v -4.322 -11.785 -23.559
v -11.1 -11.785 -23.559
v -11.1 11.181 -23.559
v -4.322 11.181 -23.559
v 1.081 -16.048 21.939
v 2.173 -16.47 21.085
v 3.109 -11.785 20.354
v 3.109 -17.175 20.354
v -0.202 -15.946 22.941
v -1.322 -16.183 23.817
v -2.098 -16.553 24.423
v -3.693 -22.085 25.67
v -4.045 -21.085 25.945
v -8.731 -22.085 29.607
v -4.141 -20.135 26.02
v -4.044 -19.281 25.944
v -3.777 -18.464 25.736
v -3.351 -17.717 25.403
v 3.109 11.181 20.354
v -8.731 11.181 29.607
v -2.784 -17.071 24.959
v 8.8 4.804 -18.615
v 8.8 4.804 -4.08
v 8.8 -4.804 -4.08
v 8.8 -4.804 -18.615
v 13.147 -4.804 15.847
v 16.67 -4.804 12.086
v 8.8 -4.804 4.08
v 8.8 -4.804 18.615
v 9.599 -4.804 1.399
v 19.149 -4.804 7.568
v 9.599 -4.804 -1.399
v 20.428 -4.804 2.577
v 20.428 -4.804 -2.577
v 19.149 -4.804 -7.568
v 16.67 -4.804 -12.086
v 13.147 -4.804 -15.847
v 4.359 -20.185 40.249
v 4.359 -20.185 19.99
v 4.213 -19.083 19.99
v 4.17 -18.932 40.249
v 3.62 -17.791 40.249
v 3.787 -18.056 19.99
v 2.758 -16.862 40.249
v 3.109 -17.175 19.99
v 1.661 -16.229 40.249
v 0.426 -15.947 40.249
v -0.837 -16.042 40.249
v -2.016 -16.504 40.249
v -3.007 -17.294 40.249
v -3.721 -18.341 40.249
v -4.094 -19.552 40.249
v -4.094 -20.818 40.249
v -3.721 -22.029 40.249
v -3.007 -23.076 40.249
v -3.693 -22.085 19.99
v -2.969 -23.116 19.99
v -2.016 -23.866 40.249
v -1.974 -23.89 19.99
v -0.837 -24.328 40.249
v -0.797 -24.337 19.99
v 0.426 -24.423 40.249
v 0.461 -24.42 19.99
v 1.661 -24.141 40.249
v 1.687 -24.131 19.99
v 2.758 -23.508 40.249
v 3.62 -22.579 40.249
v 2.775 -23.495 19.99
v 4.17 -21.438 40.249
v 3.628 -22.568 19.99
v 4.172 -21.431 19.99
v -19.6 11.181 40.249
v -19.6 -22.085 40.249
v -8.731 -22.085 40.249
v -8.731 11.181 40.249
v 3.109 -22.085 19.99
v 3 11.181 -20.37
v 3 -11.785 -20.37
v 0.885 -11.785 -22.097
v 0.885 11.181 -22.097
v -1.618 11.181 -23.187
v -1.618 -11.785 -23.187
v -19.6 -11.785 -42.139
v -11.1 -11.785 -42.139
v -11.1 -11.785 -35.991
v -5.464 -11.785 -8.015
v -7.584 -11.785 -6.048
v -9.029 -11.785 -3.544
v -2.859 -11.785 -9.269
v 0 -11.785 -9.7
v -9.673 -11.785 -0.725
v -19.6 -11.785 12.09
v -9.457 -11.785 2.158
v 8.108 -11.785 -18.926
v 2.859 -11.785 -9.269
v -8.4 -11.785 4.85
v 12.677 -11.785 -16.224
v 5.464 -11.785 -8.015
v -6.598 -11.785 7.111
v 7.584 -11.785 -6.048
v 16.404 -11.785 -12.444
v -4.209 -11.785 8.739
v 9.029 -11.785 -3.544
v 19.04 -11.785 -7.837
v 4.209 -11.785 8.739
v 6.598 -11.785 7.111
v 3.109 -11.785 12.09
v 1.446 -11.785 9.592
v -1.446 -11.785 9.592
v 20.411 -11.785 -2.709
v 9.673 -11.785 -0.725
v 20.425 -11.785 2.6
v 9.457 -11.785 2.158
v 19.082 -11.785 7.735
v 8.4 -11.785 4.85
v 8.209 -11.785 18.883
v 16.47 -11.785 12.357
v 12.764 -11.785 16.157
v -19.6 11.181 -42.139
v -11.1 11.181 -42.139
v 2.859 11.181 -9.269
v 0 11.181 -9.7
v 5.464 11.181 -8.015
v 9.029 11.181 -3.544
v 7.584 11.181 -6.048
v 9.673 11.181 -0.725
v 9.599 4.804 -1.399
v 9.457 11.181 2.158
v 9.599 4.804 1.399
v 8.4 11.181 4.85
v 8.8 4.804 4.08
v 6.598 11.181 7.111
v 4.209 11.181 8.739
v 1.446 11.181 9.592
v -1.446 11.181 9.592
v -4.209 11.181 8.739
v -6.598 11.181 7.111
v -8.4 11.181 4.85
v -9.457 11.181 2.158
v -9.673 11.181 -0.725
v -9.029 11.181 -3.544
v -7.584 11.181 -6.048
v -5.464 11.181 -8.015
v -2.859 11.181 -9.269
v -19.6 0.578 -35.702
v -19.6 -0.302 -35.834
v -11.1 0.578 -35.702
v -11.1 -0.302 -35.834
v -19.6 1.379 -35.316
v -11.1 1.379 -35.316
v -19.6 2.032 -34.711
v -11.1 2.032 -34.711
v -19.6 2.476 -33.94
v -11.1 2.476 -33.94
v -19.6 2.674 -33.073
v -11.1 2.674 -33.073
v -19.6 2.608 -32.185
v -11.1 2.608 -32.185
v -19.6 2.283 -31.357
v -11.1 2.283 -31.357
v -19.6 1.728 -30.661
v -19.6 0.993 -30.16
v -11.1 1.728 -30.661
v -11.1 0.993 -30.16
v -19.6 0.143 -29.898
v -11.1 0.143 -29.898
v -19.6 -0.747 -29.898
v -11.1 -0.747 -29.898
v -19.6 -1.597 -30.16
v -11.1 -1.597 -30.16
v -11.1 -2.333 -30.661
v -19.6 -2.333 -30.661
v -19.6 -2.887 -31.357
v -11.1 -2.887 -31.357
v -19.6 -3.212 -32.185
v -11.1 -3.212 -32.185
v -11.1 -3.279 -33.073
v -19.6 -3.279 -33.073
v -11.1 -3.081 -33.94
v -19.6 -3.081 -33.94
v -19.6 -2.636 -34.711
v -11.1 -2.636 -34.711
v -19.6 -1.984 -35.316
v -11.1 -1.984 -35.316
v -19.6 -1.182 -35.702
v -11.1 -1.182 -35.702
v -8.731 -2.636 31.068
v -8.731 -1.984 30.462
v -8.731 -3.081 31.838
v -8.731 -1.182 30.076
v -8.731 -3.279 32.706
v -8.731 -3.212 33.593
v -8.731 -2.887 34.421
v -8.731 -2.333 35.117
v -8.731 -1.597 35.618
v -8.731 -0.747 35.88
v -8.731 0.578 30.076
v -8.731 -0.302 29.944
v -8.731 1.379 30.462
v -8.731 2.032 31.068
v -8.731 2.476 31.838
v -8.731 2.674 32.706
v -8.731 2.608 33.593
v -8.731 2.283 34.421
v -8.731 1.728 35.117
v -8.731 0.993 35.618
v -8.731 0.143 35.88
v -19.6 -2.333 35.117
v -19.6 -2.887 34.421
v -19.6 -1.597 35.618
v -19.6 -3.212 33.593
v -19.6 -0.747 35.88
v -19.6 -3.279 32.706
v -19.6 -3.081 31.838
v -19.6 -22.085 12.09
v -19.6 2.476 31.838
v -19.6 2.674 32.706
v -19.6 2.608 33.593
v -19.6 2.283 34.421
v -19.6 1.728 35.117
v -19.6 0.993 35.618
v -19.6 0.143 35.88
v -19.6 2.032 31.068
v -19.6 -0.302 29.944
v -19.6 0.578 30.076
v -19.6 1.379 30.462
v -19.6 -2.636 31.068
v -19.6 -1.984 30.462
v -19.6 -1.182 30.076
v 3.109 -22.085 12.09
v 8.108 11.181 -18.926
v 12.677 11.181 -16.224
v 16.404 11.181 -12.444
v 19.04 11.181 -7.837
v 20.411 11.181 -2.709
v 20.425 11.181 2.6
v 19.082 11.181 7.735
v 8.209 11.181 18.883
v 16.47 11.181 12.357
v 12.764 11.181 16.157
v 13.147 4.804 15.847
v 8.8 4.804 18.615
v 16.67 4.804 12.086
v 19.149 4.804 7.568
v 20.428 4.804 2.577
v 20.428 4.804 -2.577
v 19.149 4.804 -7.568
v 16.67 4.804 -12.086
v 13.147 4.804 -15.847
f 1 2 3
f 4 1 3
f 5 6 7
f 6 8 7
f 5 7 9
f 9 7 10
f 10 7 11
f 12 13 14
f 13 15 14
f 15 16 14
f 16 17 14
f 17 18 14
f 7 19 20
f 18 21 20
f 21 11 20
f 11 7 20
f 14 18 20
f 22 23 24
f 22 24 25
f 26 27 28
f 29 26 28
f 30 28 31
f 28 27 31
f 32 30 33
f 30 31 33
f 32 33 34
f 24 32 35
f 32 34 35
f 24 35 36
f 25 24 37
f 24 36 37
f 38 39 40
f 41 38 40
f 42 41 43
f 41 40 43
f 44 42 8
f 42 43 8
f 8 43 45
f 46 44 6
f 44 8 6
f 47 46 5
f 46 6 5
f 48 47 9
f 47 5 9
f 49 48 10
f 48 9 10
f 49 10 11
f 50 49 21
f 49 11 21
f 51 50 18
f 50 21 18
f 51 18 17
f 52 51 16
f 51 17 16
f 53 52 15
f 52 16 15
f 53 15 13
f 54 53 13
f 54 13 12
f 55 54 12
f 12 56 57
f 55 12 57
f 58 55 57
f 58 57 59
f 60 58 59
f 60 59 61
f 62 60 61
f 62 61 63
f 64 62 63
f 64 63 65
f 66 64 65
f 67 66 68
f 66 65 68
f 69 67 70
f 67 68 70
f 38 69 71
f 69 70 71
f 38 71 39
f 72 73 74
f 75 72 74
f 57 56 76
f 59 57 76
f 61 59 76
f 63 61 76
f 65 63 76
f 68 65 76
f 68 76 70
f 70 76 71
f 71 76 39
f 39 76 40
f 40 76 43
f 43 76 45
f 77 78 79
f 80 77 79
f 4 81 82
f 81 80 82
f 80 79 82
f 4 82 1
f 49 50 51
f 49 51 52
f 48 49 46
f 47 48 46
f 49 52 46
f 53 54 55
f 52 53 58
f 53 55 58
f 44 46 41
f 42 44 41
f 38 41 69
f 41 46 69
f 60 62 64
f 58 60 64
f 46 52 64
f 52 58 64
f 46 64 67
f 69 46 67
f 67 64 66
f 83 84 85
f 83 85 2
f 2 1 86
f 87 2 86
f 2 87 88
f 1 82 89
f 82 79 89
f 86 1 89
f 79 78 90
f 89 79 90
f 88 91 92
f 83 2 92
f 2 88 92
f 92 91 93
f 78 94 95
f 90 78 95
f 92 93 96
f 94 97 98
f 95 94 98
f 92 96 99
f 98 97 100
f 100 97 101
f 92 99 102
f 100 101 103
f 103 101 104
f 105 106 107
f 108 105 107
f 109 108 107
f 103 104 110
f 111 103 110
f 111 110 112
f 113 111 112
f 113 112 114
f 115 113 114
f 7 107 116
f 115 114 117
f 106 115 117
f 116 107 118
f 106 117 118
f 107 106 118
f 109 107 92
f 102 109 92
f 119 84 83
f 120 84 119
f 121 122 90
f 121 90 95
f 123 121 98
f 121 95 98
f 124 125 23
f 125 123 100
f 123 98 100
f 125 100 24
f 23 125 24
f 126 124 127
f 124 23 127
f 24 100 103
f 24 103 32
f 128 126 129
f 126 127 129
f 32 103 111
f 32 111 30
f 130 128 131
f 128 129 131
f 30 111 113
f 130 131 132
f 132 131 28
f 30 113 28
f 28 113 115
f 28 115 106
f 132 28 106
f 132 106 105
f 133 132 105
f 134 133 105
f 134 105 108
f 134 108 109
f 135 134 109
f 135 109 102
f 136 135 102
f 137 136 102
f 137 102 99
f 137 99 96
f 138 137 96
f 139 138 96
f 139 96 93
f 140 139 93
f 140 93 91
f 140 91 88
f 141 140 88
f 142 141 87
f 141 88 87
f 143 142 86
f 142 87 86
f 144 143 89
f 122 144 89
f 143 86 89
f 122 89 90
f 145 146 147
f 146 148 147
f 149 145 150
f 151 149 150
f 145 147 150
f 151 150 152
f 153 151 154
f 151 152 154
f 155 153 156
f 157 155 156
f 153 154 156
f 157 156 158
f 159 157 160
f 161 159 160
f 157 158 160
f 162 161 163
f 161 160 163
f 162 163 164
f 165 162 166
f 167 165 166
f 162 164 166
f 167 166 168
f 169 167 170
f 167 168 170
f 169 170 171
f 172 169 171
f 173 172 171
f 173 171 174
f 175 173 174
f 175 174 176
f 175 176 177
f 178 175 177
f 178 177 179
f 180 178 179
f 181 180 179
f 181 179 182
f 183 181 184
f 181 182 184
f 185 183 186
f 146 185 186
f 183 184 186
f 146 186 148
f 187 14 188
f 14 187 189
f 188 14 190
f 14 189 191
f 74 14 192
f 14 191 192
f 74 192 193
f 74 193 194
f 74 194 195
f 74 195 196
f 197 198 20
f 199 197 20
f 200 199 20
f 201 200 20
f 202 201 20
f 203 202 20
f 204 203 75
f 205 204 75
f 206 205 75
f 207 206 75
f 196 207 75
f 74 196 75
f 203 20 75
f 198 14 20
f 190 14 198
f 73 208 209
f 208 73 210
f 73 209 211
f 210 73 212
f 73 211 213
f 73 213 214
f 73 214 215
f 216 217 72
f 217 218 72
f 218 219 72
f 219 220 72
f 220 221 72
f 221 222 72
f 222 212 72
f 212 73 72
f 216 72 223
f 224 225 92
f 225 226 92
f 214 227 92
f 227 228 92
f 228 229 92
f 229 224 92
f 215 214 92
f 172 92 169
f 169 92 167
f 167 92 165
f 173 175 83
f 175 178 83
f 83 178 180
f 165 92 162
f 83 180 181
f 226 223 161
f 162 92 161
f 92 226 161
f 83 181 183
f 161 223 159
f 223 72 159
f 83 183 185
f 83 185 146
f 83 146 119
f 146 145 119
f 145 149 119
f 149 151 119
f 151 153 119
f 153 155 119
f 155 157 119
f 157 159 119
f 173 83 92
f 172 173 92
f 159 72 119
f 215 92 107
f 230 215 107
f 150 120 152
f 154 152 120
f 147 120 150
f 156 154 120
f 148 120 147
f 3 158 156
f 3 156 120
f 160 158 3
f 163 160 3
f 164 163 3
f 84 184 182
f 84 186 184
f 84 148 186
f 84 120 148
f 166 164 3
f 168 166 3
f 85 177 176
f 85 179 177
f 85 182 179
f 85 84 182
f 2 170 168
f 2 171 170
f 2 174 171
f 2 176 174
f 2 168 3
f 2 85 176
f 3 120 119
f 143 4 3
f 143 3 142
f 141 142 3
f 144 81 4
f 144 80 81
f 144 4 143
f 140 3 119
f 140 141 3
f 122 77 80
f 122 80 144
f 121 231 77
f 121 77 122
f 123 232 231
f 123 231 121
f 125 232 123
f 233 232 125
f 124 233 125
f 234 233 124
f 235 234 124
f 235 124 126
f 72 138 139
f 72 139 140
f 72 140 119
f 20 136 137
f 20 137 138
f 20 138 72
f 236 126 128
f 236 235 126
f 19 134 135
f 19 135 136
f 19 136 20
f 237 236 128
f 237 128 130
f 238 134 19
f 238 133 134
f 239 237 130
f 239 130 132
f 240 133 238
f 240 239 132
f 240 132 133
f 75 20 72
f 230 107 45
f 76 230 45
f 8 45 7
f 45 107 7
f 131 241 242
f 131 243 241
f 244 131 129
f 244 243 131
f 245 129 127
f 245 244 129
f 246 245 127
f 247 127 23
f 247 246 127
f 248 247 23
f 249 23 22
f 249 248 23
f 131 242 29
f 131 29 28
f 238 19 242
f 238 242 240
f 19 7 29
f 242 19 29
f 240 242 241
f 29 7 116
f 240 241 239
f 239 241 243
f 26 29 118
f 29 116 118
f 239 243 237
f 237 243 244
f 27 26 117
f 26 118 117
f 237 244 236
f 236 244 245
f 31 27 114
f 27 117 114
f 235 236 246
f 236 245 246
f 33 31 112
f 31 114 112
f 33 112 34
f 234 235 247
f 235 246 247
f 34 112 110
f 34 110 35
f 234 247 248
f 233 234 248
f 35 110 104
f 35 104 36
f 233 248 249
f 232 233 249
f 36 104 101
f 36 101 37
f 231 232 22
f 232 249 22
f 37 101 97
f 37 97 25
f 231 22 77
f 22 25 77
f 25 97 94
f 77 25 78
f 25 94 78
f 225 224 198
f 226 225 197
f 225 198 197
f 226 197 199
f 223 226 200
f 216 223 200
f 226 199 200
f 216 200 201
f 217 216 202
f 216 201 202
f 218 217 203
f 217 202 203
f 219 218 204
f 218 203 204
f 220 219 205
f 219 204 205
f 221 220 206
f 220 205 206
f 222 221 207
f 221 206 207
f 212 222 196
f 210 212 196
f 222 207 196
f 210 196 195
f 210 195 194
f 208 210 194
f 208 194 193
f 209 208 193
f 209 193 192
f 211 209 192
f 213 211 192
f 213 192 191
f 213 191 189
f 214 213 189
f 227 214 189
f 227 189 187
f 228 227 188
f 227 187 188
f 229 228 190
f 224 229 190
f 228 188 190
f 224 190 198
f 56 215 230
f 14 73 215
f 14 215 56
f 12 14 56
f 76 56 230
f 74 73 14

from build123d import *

# Parameters (mm, degrees)
SKETCH_1_R                = 20.68
SKETCH_1_R_2              = 9.68
EXTRUDE_1_DEPTH           = 116.68
SKETCH_11_W               = 27
SKETCH_11_H               = 150
CUT_EXTRUDE_3_DEPTH       = 40
SKETCH_13_W               = 10
SKETCH_13_H               = 128.345013401
CUT_EXTRUDE_7_DEPTH       = 126.614916312
SKETCH_15_W               = 8
SKETCH_15_H               = 68.68
CUT_EXTRUDE_9_DEPTH       = 48
SKETCH_16_W               = 15.549431524
SKETCH_16_H               = 20
SKETCH_16_W_2             = 15.459431524
EXTRUDE_4_DEPTH           = 19.2
SKETCH_17_W               = 19.20851187
SKETCH_17_H               = 14.03
CUT_EXTRUDE_10_DEPTH      = 20.2
SKETCH_18_R               = 9.59
CUT_EXTRUDE_11_DEPTH      = 121.289430957
SKETCH_21_R               = 2.985
CUT_EXTRUDE_12_DEPTH      = 55.2
EXTRUDE_START             = 55.2
SKETCH_24_R               = 20.59
SKETCH_24_R_2             = 9.59
EXTRUDE_2_DEPTH           = 55.2
CUT_EXTRUDE_13_DEPTH      = 55.2
SKETCH_26_W               = 10.00851187
SKETCH_26_H               = 41.68
CUT_EXTRUDE_15_DEPTH      = 55.2
SKETCH_27_W               = 10
SKETCH_27_H               = 40
CUT_EXTRUDE_16_DEPTH      = 55.2
SKETCH_28_W               = 44.880694938
SKETCH_28_H               = 9.608044066
CUT_EXTRUDE_17_DEPTH      = 12.2
SKETCH_35_W               = 13.53
SKETCH_35_H               = 20
EXTRUDE_10_DEPTH          = 15
EXTRUDE_11_DEPTH          = 15
SKETCH_37_W               = 9
SKETCH_37_H               = 20
EXTRUDE_12_DEPTH          = 20
SKETCH_38_W               = 9
SKETCH_38_H               = 20
EXTRUDE_13_DEPTH          = 20
SKETCH_42_R               = 2.985
CUT_EXTRUDE_21_DEPTH      = 20
CUT_EXTRUDE_23_DEPTH      = 138.235841092
SKETCH_45_W               = 3
SKETCH_45_H               = 20
EXTRUDE_14_DEPTH          = 30
SKETCH_46_W               = 3
SKETCH_46_H               = 20
EXTRUDE_15_DEPTH          = 30
SKETCH_47_W               = 33.078221107
SKETCH_47_H               = 20
EXTRUDE_16_DEPTH          = 50
SKETCH_48_W               = 30
SKETCH_48_H               = 20
EXTRUDE_17_DEPTH          = 50
SKETCH_50_W               = 50
SKETCH_50_H               = 20
EXTRUDE_18_DEPTH          = 1
SKETCH_51_W               = 50
SKETCH_51_H               = 20
EXTRUDE_19_DEPTH          = 1
SKETCH_52_W               = 53
SKETCH_52_H               = 14
CUT_EXTRUDE_24_DEPTH      = 151.972575738
SKETCH_53_W               = 53
SKETCH_53_H               = 14
CUT_EXTRUDE_25_DEPTH      = 151.942387436
SKETCH_54_W               = 40
SKETCH_54_H               = 73.27
CUT_EXTRUDE_26_DEPTH      = 147.866192927
SKETCH_56_W               = 13.00851187
SKETCH_56_H               = 20
EXTRUDE_21_DEPTH          = 3.08
SKETCH_60_W               = 6.504255935
SKETCH_60_H               = 76.35
CUT_EXTRUDE_30_DEPTH      = 137.106994034
CUT_EXTRUDE_32_DEPTH      = 20
SKETCH_64_W               = 16.20851187
SKETCH_64_H               = 0.09
EXTRUDE_22_DEPTH          = 20
SKETCH_65_W               = 3.495744065
SKETCH_65_H               = 3.26
CUT_EXTRUDE_33_DEPTH      = 137.057988464
SKETCH_66_W               = 3.495744065
SKETCH_66_H               = 1.776778893
SKETCH_66_W_2             = 3.503635083
SKETCH_66_H_2             = 1.775
EXTRUDE_23_DEPTH          = 20.2
SKETCH_68_W               = 6.504255935
SKETCH_68_H               = 3.66
CUT_EXTRUDE_34_DEPTH      = 20
SKETCH_69_R               = 2.985
CUT_EXTRUDE_35_DEPTH      = 126.598983893
SKETCH_70_R               = 2.985
CUT_EXTRUDE_36_DEPTH      = 132.360728238
SKETCH_71_W               = 38.005321573
SKETCH_71_H               = 111.965885132
CUT_EXTRUDE_37_DEPTH      = 147.475577566
SKETCH_72_R               = 9.7
CUT_EXTRUDE_38_DEPTH      = 38.185254838
CUT_EXTRUDE_START         = -22
SKETCH_77_R               = 30.59
SKETCH_77_R_2             = 20.59
CUT_EXTRUDE_2_DEPTH       = 22
SKETCH_78_W               = 34.816185151
SKETCH_78_H               = 22.96559116
EXTRUDE_26_DEPTH          = 0.1
SKETCH_80_W               = 2.900031179
SKETCH_80_H               = 6.148706656
EXTRUDE_28_DEPTH          = 23.1
SKETCH_81_W               = 6.148706656
SKETCH_81_H               = 23.1
EXTRUDE_29_DEPTH          = 14.1
SKETCH_82_W               = 6.148706656
SKETCH_82_H               = 0.13440884
CUT_EXTRUDE_39_DEPTH      = 19.1
SKETCH_83_W               = 2.900031179
SKETCH_83_H               = 22.96559116
EXTRUDE_30_DEPTH          = 19.1
FILLET_1_R                = 10
SKETCH_84_W               = 3.5
SKETCH_84_H               = 19.1
EXTRUDE_31_DEPTH          = 23.1
SKETCH_85_W               = 3.5
SKETCH_85_H               = 0.52
CUT_EXTRUDE_40_DEPTH      = 48.860163141
SKETCH_86_W               = 3.5
SKETCH_86_H               = 22.96559116
EXTRUDE_32_DEPTH          = 62.1
SKETCH_87_W               = 3.60851187
SKETCH_87_H               = 34.816185151
CUT_EXTRUDE_41_DEPTH      = 62.1
SKETCH_89_W               = 0.10851187
SKETCH_89_H               = 6.15
EXTRUDE_33_DEPTH          = 23.1
EXTRUDE_34_DEPTH          = 22.1
SKETCH_91_W               = 0.971561636
SKETCH_91_H               = 22.96559116
CUT_EXTRUDE_42_DEPTH      = 22.1
SKETCH_95_W               = 6.15
SKETCH_95_H               = 22.96559116
EXTRUDE_35_DEPTH          = 14.1
FILLET_2_R                = 10
SKETCH_96_W               = 3.60851187
SKETCH_96_H               = 2.548438364
CUT_EXTRUDE_43_DEPTH      = 55.35700885
SKETCH_97_W               = 3.5
SKETCH_97_H               = 6.148706656
EXTRUDE_36_DEPTH          = 23.1
CUT_EXTRUDE_44_DEPTH      = 23.1
SKETCH_99_W               = 6.15
SKETCH_99_H               = 0.13440884
CUT_EXTRUDE_45_DEPTH      = 23.1
SKETCH_101_R              = 2.985
CUT_EXTRUDE_46_DEPTH      = 23.1
SKETCH_103_W              = 3.60851187
SKETCH_103_H              = 0.54
CUT_EXTRUDE_49_DEPTH      = 53.222714265
SKETCH_104_W              = 3.60851187
SKETCH_104_H              = 0.54
CUT_EXTRUDE_50_DEPTH      = 53.222714265
SKETCH_105_W              = 14.1
SKETCH_105_H              = 22.96559116
EXTRUDE_37_DEPTH          = 30
SKETCH_106_W              = 8.260608777
SKETCH_106_H              = 22.96559116
CUT_EXTRUDE_52_DEPTH      = 61.301547389
SKETCH_107_R              = 2.985
CUT_EXTRUDE_53_DEPTH      = 54.964080882
SKETCH_108_W              = 3.60851187
SKETCH_108_H              = 22.96559116
EXTRUDE_38_DEPTH          = 40
SKETCH_109_W              = 84.280268292
SKETCH_109_H              = 22.96559116
EXTRUDE_39_DEPTH          = 5
SKETCH_110_R              = 2.985
CUT_EXTRUDE_54_DEPTH      = 57.152183688
SKETCH_111_R              = 2.985
CUT_EXTRUDE_55_DEPTH      = 50.299169813
CUT_EXTRUDE_56_DEPTH      = 53.222714265
EXTRUDE_40_DEPTH          = 10.3
EXTRUDE_44_DEPTH          = 0.01
EXTRUDE_44_DEPTH_BACK     = 30.01
SKETCH_120_R              = 4.25
CUT_EXTRUDE_58_DEPTH      = 60.346587307
CUT_EXTRUDE_58_DEPTH_BACK = 60.346587307
SKETCH_121_W              = 49.202417837
SKETCH_121_H              = 14.707819526


with BuildPart() as part:
    # 草圖1 → 伸長-薄件1 (new body)
    with BuildSketch(Plane(origin=(0, 0, 0), x_dir=(1, 0, 0), z_dir=(0, 1, 0))):
        Circle(SKETCH_1_R)
        Circle(SKETCH_1_R_2, mode=Mode.SUBTRACT)
    extrude(amount=EXTRUDE_1_DEPTH)

    # 草圖11 → 除料-伸長3 (cut)
    with BuildSketch(Plane(origin=(0, 116.68, 0), x_dir=(1, 0, 0), z_dir=(0, 1, 0))):
        with Locations((21.70851187, -44.235815192)):
            Rectangle(SKETCH_11_W, SKETCH_11_H)
    extrude(amount=-CUT_EXTRUDE_3_DEPTH, mode=Mode.SUBTRACT)

    # 草圖13 → 除料-伸長7 (cut, through all)
    with BuildSketch(Plane.XY.offset(21)):
        with Locations((-16, 58.612182466)):
            Rectangle(SKETCH_13_W, SKETCH_13_H)
    extrude(amount=-CUT_EXTRUDE_7_DEPTH, mode=Mode.SUBTRACT)

    # 草圖15 → 除料-伸長9 (cut)
    with BuildSketch(Plane.XY.offset(21)):
        with Locations((-1.395744065, 52.34)):
            Rectangle(SKETCH_15_W, SKETCH_15_H)
    extrude(amount=-CUT_EXTRUDE_9_DEPTH, mode=Mode.SUBTRACT)

    # 草圖16 → 填料-伸長4 (add)
    with BuildSketch(Plane(origin=(8.20851187, 0, 0), x_dir=(0, 0, -1), z_dir=(1, 0, 0))):
        with Locations((12.905284238, 106.68)):
            Rectangle(SKETCH_16_W, SKETCH_16_H)
        with Locations((-12.860284238, 106.68)):
            Rectangle(SKETCH_16_W_2, SKETCH_16_H)
    extrude(amount=-EXTRUDE_4_DEPTH)

    # 草圖17 → 除料-伸長10 (cut)
    with BuildSketch(Plane(origin=(0, 116.68, 0), x_dir=(1, 0, 0), z_dir=(0, 1, 0))):
        with Locations((-1.395744065, -0.045)):
            Rectangle(SKETCH_17_W, SKETCH_17_H)
    extrude(amount=-CUT_EXTRUDE_10_DEPTH, mode=Mode.SUBTRACT)

    # 草圖18 → 除料-伸長11 (cut, through all)
    with BuildSketch(Plane.XZ):
        with Locations(Location((0, 0, 0), (0, 0, 90))):
            Circle(SKETCH_18_R)
    extrude(amount=-CUT_EXTRUDE_11_DEPTH, mode=Mode.SUBTRACT)

    # 草圖21 → 除料-伸長12 (cut)
    with BuildSketch(Plane(origin=(0, 0, -20.68), x_dir=(-1, 0, 0), z_dir=(0, 0, -1))):
        with Locations((1.39148813, 108.73)):
            Circle(SKETCH_21_R)
    extrude(amount=-CUT_EXTRUDE_12_DEPTH, mode=Mode.SUBTRACT)

    # 草圖24 → 伸長-薄件2 (add)
    with BuildSketch(Plane.XZ.offset(EXTRUDE_START)):
        Circle(SKETCH_24_R)
        Circle(SKETCH_24_R_2, mode=Mode.SUBTRACT)
    extrude(amount=-EXTRUDE_2_DEPTH)

    # 草圖25 → 除料-伸長13 (cut)
    with BuildSketch(Plane.XY.offset(21)):
        Polygon((-1.39148813, -11.785), (22.612379708, -11.785), (22.612379708, -63.873337429), (-22.749525245, -63.873337429), (-22.749525245, -11.785), align=None)
    extrude(amount=-CUT_EXTRUDE_13_DEPTH, mode=Mode.SUBTRACT)

    # 草圖26 → 除料-伸長15 (cut)
    with BuildSketch(Plane(origin=(0, 0, 0), x_dir=(1, 0, 0), z_dir=(0, 1, 0))):
        with Locations((-15.995744065, -0.16)):
            Rectangle(SKETCH_26_W, SKETCH_26_H)
    extrude(amount=-CUT_EXTRUDE_15_DEPTH, mode=Mode.SUBTRACT)

    # 草圖27 → 除料-伸長16 (cut)
    with BuildSketch(Plane(origin=(21, 0, 0), x_dir=(0, 0, -1), z_dir=(1, 0, 0))):
        with Locations((0, 41.68)):
            Rectangle(SKETCH_27_W, SKETCH_27_H)
    extrude(amount=-CUT_EXTRUDE_16_DEPTH, mode=Mode.SUBTRACT)

    # 草圖28 → 除料-伸長17 (cut)
    with BuildSketch(Plane(origin=(21, 0, 0), x_dir=(0, 0, -1), z_dir=(1, 0, 0))):
        Rectangle(SKETCH_28_W, SKETCH_28_H)
    extrude(amount=-CUT_EXTRUDE_17_DEPTH, mode=Mode.SUBTRACT)

    # 草圖35 → 填料-伸長10 (add)
    with BuildSketch(Plane.ZY.offset(10.99148813)):
        with Locations((13.825, 106.68)):
            Rectangle(SKETCH_35_W, SKETCH_35_H)
    extrude(amount=EXTRUDE_10_DEPTH)

    # 草圖36 → 填料-伸長11 (add)
    with BuildSketch(Plane.ZY.offset(10.99148813)):
        Polygon((-20.68, 116.68), (-6.97, 116.68), (-6.97, 96.48), (-20.68, 96.68), align=None)
    extrude(amount=EXTRUDE_11_DEPTH)

    # 草圖37 → 填料-伸長12 (add)
    with BuildSketch(Plane.XY.offset(20.59)):
        with Locations((-21.49148813, 106.68)):
            Rectangle(SKETCH_37_W, SKETCH_37_H)
    extrude(amount=EXTRUDE_12_DEPTH)

    # 草圖38 → 填料-伸長13 (add)
    with BuildSketch(Plane(origin=(0, 0, -20.68), x_dir=(-1, 0, 0), z_dir=(0, 0, -1))):
        with Locations((21.49148813, 106.68)):
            Rectangle(SKETCH_38_W, SKETCH_38_H)
    extrude(amount=EXTRUDE_13_DEPTH)

    # 草圖42 → 除料-伸長21 (cut)
    with BuildSketch(Plane(origin=(-16.99148813, 0, 0), x_dir=(0, 0, -1), z_dir=(1, 0, 0))):
        with Locations((30.68, 106.554418142)):
            Circle(SKETCH_42_R)
        with Locations((-30.395640125, 106.68)):
            Circle(SKETCH_42_R)
    extrude(amount=-CUT_EXTRUDE_21_DEPTH, mode=Mode.SUBTRACT)

    # 草圖43 → 除料-伸長23 (cut, through all)
    with BuildSketch(Plane(origin=(0, 116.68, 0), x_dir=(1, 0, 0), z_dir=(0, 1, 0))):
        Polygon((-11, 6.97), (-10.99148813, 20.68), (-10.99148813, 48.096794253), (-28.274756234, 48.096794253), (-28.274756234, -43.270506289), (-11, -43.270506289), align=None)
    extrude(amount=-CUT_EXTRUDE_23_DEPTH, mode=Mode.SUBTRACT)

    # 草圖45 → 填料-伸長14 (add)
    with BuildSketch(Plane.XY.offset(20.59)):
        with Locations((-9.5, 106.68)):
            Rectangle(SKETCH_45_W, SKETCH_45_H)
    extrude(amount=EXTRUDE_14_DEPTH)

    # 草圖46 → 填料-伸長15 (add)
    with BuildSketch(Plane(origin=(0, 0, -20.68), x_dir=(-1, 0, 0), z_dir=(0, 0, -1))):
        with Locations((9.49148813, 106.68)):
            Rectangle(SKETCH_46_W, SKETCH_46_H)
    extrude(amount=EXTRUDE_15_DEPTH)

    # 草圖47 → 填料-伸長16 (add)
    with BuildSketch(Plane.ZY.offset(11)):
        with Locations((34.050889447, 106.68)):
            Rectangle(SKETCH_47_W, SKETCH_47_H)
    extrude(amount=EXTRUDE_16_DEPTH)

    # 草圖48 → 填料-伸長17 (add)
    with BuildSketch(Plane.ZY.offset(10.99148813)):
        with Locations((-35.68, 106.68)):
            Rectangle(SKETCH_48_W, SKETCH_48_H)
    extrude(amount=EXTRUDE_17_DEPTH)

    # 草圖50 → 填料-伸長18 (add)
    with BuildSketch(Plane(origin=(0, 0, 17.511778893), x_dir=(-1, 0, 0), z_dir=(0, 0, -1))):
        with Locations((36, 106.68)):
            Rectangle(SKETCH_50_W, SKETCH_50_H)
    extrude(amount=EXTRUDE_18_DEPTH)

    # 草圖51 → 填料-伸長19 (add)
    with BuildSketch(Plane.XY.offset(-20.68)):
        with Locations((-35.99148813, 106.68)):
            Rectangle(SKETCH_51_W, SKETCH_51_H)
    extrude(amount=EXTRUDE_19_DEPTH)

    # 草圖52 → 除料-伸長24 (cut, through all)
    with BuildSketch(Plane(origin=(0, 116.68, 0), x_dir=(1, 0, 0), z_dir=(0, 1, 0))):
        with Locations((-34.49148813, 43.68)):
            Rectangle(SKETCH_52_W, SKETCH_52_H)
    extrude(amount=-CUT_EXTRUDE_24_DEPTH, mode=Mode.SUBTRACT)

    # 草圖53 → 除料-伸長25 (cut, through all)
    with BuildSketch(Plane(origin=(0, 116.68, 0), x_dir=(1, 0, 0), z_dir=(0, 1, 0))):
        with Locations((-34.5, -43.59)):
            Rectangle(SKETCH_53_W, SKETCH_53_H)
    extrude(amount=-CUT_EXTRUDE_25_DEPTH, mode=Mode.SUBTRACT)

    # 草圖54 → 除料-伸長26 (cut, through all)
    with BuildSketch(Plane(origin=(0, 116.68, 0), x_dir=(1, 0, 0), z_dir=(0, 1, 0))):
        with Locations((-41, 0.045)):
            Rectangle(SKETCH_54_W, SKETCH_54_H)
    extrude(amount=-CUT_EXTRUDE_26_DEPTH, mode=Mode.SUBTRACT)

    # 草圖56 → 填料-伸長21 (add)
    with BuildSketch(Plane(origin=(0, 0, -36.68), x_dir=(-1, 0, 0), z_dir=(0, 0, -1))):
        with Locations((14.495744065, 106.68)):
            Rectangle(SKETCH_56_W, SKETCH_56_H)
    extrude(amount=EXTRUDE_21_DEPTH)

    # 草圖60 → 除料-伸長30 (cut, through all)
    with BuildSketch(Plane(origin=(0, 116.68, 0), x_dir=(1, 0, 0), z_dir=(0, 1, 0))):
        with Locations((-17.747872032, 1.585)):
            Rectangle(SKETCH_60_W, SKETCH_60_H)
    extrude(amount=-CUT_EXTRUDE_30_DEPTH, mode=Mode.SUBTRACT)

    # 草圖61 → 除料-伸長32 (cut)
    with BuildSketch(Plane(origin=(0, 116.68, 0), x_dir=(1, 0, 0), z_dir=(0, 1, 0))):
        Polygon((1.92725193, -20.59), (1.92725193, -22.399121663), (-2.174190472, -21.421542421), (-2.174190472, -20.59), align=None)
    extrude(amount=-CUT_EXTRUDE_32_DEPTH, mode=Mode.SUBTRACT)

    # 草圖64 → 填料-伸長22 (add)
    with BuildSketch(Plane(origin=(0, 116.68, 0), x_dir=(1, 0, 0), z_dir=(0, 1, 0))):
        with Locations((0.104255935, -20.635)):
            Rectangle(SKETCH_64_W, SKETCH_64_H)
    extrude(amount=-EXTRUDE_22_DEPTH)

    # 草圖65 → 除料-伸長33 (cut, through all)
    with BuildSketch(Plane(origin=(0, 116.68, 0), x_dir=(1, 0, 0), z_dir=(0, 1, 0))):
        with Locations((-12.747872033, -18.141778893)):
            Rectangle(SKETCH_65_W, SKETCH_65_H)
    extrude(amount=-CUT_EXTRUDE_33_DEPTH, mode=Mode.SUBTRACT)

    # 草圖66 → 填料-伸長23 (add)
    with BuildSketch(Plane(origin=(0, 96.48, 0), x_dir=(1, 0, 0), z_dir=(0, 1, 0))):
        with Locations((-12.747872033, -18.883389447)):
            Rectangle(SKETCH_66_W, SKETCH_66_H)
        with Locations((-12.743926524, 18.7925)):
            Rectangle(SKETCH_66_W_2, SKETCH_66_H_2)
    extrude(amount=EXTRUDE_23_DEPTH)

    # 草圖68 → 除料-伸長34 (cut)
    with BuildSketch(Plane(origin=(0, 116.68, 0), x_dir=(1, 0, 0), z_dir=(0, 1, 0))):
        with Locations((-11.243616098, 37.93)):
            Rectangle(SKETCH_68_W, SKETCH_68_H)
    extrude(amount=-CUT_EXTRUDE_34_DEPTH, mode=Mode.SUBTRACT)

    # 草圖69 → 除料-伸長35 (cut, through all)
    with BuildSketch(Plane(origin=(-7.99148813, 0, 0), x_dir=(0, 0, -1), z_dir=(1, 0, 0))):
        with Locations((28.39, 106.68)):
            Circle(SKETCH_69_R)
        with Locations((-28.635, 106.68)):
            Circle(SKETCH_69_R)
    extrude(amount=-CUT_EXTRUDE_35_DEPTH, mode=Mode.SUBTRACT)

    # 草圖70 → 除料-伸長36 (cut, through all)
    with BuildSketch(Plane(origin=(0, 0, 20.59), x_dir=(-1, 0, 0), z_dir=(0, 0, -1))):
        with Locations((1.39148813, 108.73)):
            Circle(SKETCH_70_R)
    extrude(amount=-CUT_EXTRUDE_36_DEPTH, mode=Mode.SUBTRACT)

    # 草圖71 → 除料-伸長37 (cut, through all)
    with BuildSketch(Plane.XY.offset(50)):
        with Locations((2.76131712, 67.163533726)):
            Rectangle(SKETCH_71_W, SKETCH_71_H)
    extrude(amount=-CUT_EXTRUDE_37_DEPTH, mode=Mode.SUBTRACT)

    # 草圖72 → 除料-伸長38 (cut, through all)
    with BuildSketch(Plane.XZ.offset(11.785)):
        with Locations(Location((0, 0, 0), (0, 0, 270))):
            Circle(SKETCH_72_R)
    extrude(amount=-CUT_EXTRUDE_38_DEPTH, mode=Mode.SUBTRACT)

    # 草圖77 → 除料-伸長-薄件2 (cut)
    with BuildSketch(Plane(origin=(0, 11.18059116, 0), x_dir=(1, 0, 0), z_dir=(0, 1, 0)).offset(CUT_EXTRUDE_START)):
        Circle(SKETCH_77_R)
        Circle(SKETCH_77_R_2, mode=Mode.SUBTRACT)
    extrude(amount=CUT_EXTRUDE_2_DEPTH, mode=Mode.SUBTRACT)

    # 草圖78 → 填料-伸長26 (add)
    with BuildSketch(Plane.ZY.offset(11)):
        with Locations((-0.002688243, -0.30220442)):
            Rectangle(SKETCH_78_W, SKETCH_78_H)
    extrude(amount=EXTRUDE_26_DEPTH)



with BuildPart() as body_2:
    # 草圖80 → 填料-伸長28 (new body)
    with BuildSketch(Plane.XZ.offset(11.785)):
        with Locations((-12.55001559, -20.485134146)):
            Rectangle(SKETCH_80_W, SKETCH_80_H)
    extrude(amount=-EXTRUDE_28_DEPTH)


with BuildPart() as part_1:
    add(part.part)

    add(body_2.part)  # 填料-伸長29 merges body 2
    # 草圖81 → 填料-伸長29 (add)
    with BuildSketch(Plane(origin=(-11.1, 0, 0), x_dir=(0, 0, -1), z_dir=(1, 0, 0))):
        with Locations((20.485134146, -0.235)):
            Rectangle(SKETCH_81_W, SKETCH_81_H)
    extrude(amount=EXTRUDE_29_DEPTH)

    # 草圖82 → 除料-伸長39 (cut)
    with BuildSketch(Plane(origin=(3, 0, 0), x_dir=(0, 0, -1), z_dir=(1, 0, 0))):
        with Locations((20.485134146, 11.24779558)):
            Rectangle(SKETCH_82_W, SKETCH_82_H)
    extrude(amount=-CUT_EXTRUDE_39_DEPTH, mode=Mode.SUBTRACT)

    # 草圖83 → 填料-伸長30 (add)
    with BuildSketch(Plane.XY.offset(-17.410780818)):
        with Locations((-12.55001559, -0.30220442)):
            Rectangle(SKETCH_83_W, SKETCH_83_H)
    extrude(amount=-EXTRUDE_30_DEPTH)

    # 圓角1
    # the kernel refuses this fillet: 10 mm, written as the material it takes off along each edge
    with BuildSketch(Plane(origin=(3, -30.090254449, -23.559487474), x_dir=(-1, 0, 0), z_dir=(0, 1, 0))) as fillet_1_piece_1:
        with BuildLine():
            CenterArc((7.32210178, 10), FILLET_1_R, 222.927997508, 47.072002492)
            Line((0, 3.189212562), (-0.146442036, 3.052996813))
            ThreePointArc((-0.146442036, 3.052996813), (-0.2, 1.594606281), (-0.2, 0))
            Line((-0.2, 0), (0, -0.2))
            Line((0, -0.2), (7.32210178, -0.2))
            Line((7.32210178, -0.2), (7.32210178, 0))
        make_face()
    extrude(amount=59.576100059, mode=Mode.SUBTRACT)

    # 草圖84 → 填料-伸長31 (add)
    with BuildSketch(Plane(origin=(0, -11.785, 0), x_dir=(-1, 0, 0), z_dir=(0, -1, 0))):
        with Locations((12.85, 26.960780818)):
            Rectangle(SKETCH_84_W, SKETCH_84_H)
    extrude(amount=-EXTRUDE_31_DEPTH)

    # 草圖85 → 除料-伸長40 (cut, through all)
    with BuildSketch(Plane.XZ.offset(11.785)):
        with Locations((-12.85, -36.250780818)):
            Rectangle(SKETCH_85_W, SKETCH_85_H)
    extrude(amount=-CUT_EXTRUDE_40_DEPTH, mode=Mode.SUBTRACT)

    # 草圖86 → 填料-伸長32 (add)
    with BuildSketch(Plane.XY.offset(-17.410780818)):
        with Locations((-12.85, -0.30220442)):
            Rectangle(SKETCH_86_W, SKETCH_86_H)
    extrude(amount=EXTRUDE_32_DEPTH)

    # 草圖87 → 除料-伸長41 (cut)
    with BuildSketch(Plane.XZ.offset(11.785)):
        with Locations((-12.795744065, -0.002688243)):
            Rectangle(SKETCH_87_W, SKETCH_87_H)
    extrude(amount=-CUT_EXTRUDE_41_DEPTH, mode=Mode.SUBTRACT)


with BuildPart() as cut_extrude_41_piece_1:
    # of the separate pieces the step leaves, piece 1, a body of its own (cut_extrude_41_pieces)
    add(part_1.part.solids().sort_by_distance((3, 11.18059116, -20.370274912))[0])



with BuildPart() as cut_extrude_41_piece_2:
    # of the separate pieces the step leaves, piece 2, a body of its own (cut_extrude_41_pieces)
    add(part_1.part.solids().sort_by_distance((-11.1, 11.18059116, 17.405404333))[0])

    # 草圖89 → 填料-伸長33 (add)
    with BuildSketch(Plane.XZ.offset(11.785)):
        with Locations((-11.045744065, 20.485780818)):
            Rectangle(SKETCH_89_W, SKETCH_89_H)
    extrude(amount=-EXTRUDE_33_DEPTH)

    # 草圖90 → 填料-伸長34 (add)
    with BuildSketch(Plane.XY.offset(23.560780818)):
        Polygon((-11, 11.18059116), (-11.1, 11.18059116), (-11.1, -11.785), (-10.99148813, -11.785), (-10.99148813, 11.18059116), align=None)
    extrude(amount=EXTRUDE_34_DEPTH)

    # 草圖91 → 除料-伸長42 (cut)
    with BuildSketch(Plane.ZY.offset(11.1)):
        with Locations((45.175, -0.30220442)):
            Rectangle(SKETCH_91_W, SKETCH_91_H)
    extrude(amount=-CUT_EXTRUDE_42_DEPTH, mode=Mode.SUBTRACT)


with BuildPart() as cut_extrude_41_piece_1_1:
    add(cut_extrude_41_piece_1.part)

    add(cut_extrude_41_piece_2.part)  # 填料-伸長35 merges 除料-伸長41 piece 2
    # 草圖95 → 填料-伸長35 (add)
    with BuildSketch(Plane(origin=(-10.99148813, 0, 0), x_dir=(0, 0, -1), z_dir=(1, 0, 0))):
        with Locations((-20.485780818, -0.30220442)):
            Rectangle(SKETCH_95_W, SKETCH_95_H)
    extrude(amount=EXTRUDE_35_DEPTH)

    # 圓角2
    # the kernel refuses this fillet: 10 mm, written as the material it takes off along each edge
    with BuildSketch(Plane(origin=(3.10851187, -30.131013506, 23.560780818), x_dir=(-1, 0, 0), z_dir=(0, 1, 0))) as fillet_2_piece_1:
        with BuildLine():
            CenterArc((7.338405402, -10), FILLET_2_R, 90, 47.209333859)
            Line((0, -3.206782342), (-0.146768108, -3.070917989))
            ThreePointArc((-0.146768108, -3.070917989), (-0.2, -1.603391171), (-0.2, 0))
            Line((-0.2, 0), (0, 0.2))
            Line((0, 0.2), (7.338405402, 0.2))
            Line((7.338405402, 0.2), (7.338405402, 0))
        make_face()
    extrude(amount=59.657618171, mode=Mode.SUBTRACT)

    # 草圖96 → 除料-伸長43 (cut, through all)
    with BuildSketch(Plane.XZ.offset(11.785)):
        with Locations((-12.795744065, 43.415)):
            Rectangle(SKETCH_96_W, SKETCH_96_H)
    extrude(amount=-CUT_EXTRUDE_43_DEPTH, mode=Mode.SUBTRACT)

    # 草圖97 → 填料-伸長36 (add)
    with BuildSketch(Plane.XZ.offset(11.785)):
        with Locations((-12.85, -39.065134146)):
            Rectangle(SKETCH_97_W, SKETCH_97_H)
    extrude(amount=-EXTRUDE_36_DEPTH)

    # 草圖98 → 除料-伸長44 (cut)
    with BuildSketch(Plane(origin=(-11.1, 0, 0), x_dir=(0, 0, -1), z_dir=(1, 0, 0))):
        Polygon((17.410780818, 11.18059116), (17.410780818, 11.315), (22.198280677, 11.315), (38.461669752, 11.315), (42.139487474, 11.315), (42.139487474, 11.18059116), align=None)
    extrude(amount=-CUT_EXTRUDE_44_DEPTH, mode=Mode.SUBTRACT)

    # 草圖99 → 除料-伸長45 (cut)
    with BuildSketch(Plane(origin=(-10.99148813, 0, 0), x_dir=(0, 0, -1), z_dir=(1, 0, 0))):
        with Locations((-20.485780818, 11.24779558)):
            Rectangle(SKETCH_99_W, SKETCH_99_H)
    extrude(amount=-CUT_EXTRUDE_45_DEPTH, mode=Mode.SUBTRACT)

    # 草圖101 → 除料-伸長46 (cut)
    with BuildSketch(Plane(origin=(-10.99148813, 0, 0), x_dir=(0, 0, -1), z_dir=(1, 0, 0))):
        with Locations((-32.928668636, -0.30220442)):
            Circle(SKETCH_101_R)
        with Locations((32.849487474, -0.30220442)):
            Circle(SKETCH_101_R)
    extrude(amount=-CUT_EXTRUDE_46_DEPTH, mode=Mode.SUBTRACT)

    # 草圖103 → 除料-伸長49 (cut, through all)
    with BuildSketch(Plane(origin=(0, 11.18059116, 0), x_dir=(1, 0, 0), z_dir=(0, 1, 0))):
        with Locations((-12.795744065, -17.675404333)):
            Rectangle(SKETCH_103_W, SKETCH_103_H)
    extrude(amount=-CUT_EXTRUDE_49_DEPTH, mode=Mode.SUBTRACT)

    # 草圖104 → 除料-伸長50 (cut, through all)
    with BuildSketch(Plane(origin=(0, 11.18059116, 0), x_dir=(1, 0, 0), z_dir=(0, 1, 0))):
        with Locations((-12.795744065, 17.680780818)):
            Rectangle(SKETCH_104_W, SKETCH_104_H)
    extrude(amount=-CUT_EXTRUDE_50_DEPTH, mode=Mode.SUBTRACT)

    # 草圖105 → 填料-伸長37 (add)
    with BuildSketch(Plane.XY.offset(50)):
        with Locations((-3.94148813, -0.30220442)):
            Rectangle(SKETCH_105_W, SKETCH_105_H)
    extrude(amount=-EXTRUDE_37_DEPTH)

    # 草圖106 → 除料-伸長52 (cut, through all)
    with BuildSketch(Plane.ZY.offset(10.99148813)):
        with Locations((46.271085207, -0.30220442)):
            Rectangle(SKETCH_106_W, SKETCH_106_H)
    extrude(amount=-CUT_EXTRUDE_52_DEPTH, mode=Mode.SUBTRACT)

    # 草圖107 → 除料-伸長53 (cut, through all)
    with BuildSketch(Plane.ZY.offset(10.99148813)):
        with Locations(Location((32.928668636, -0.30220442, 0), (0, 0, 180))):
            Circle(SKETCH_107_R)
    extrude(amount=-CUT_EXTRUDE_53_DEPTH, mode=Mode.SUBTRACT)

    # 草圖108 → 填料-伸長38 (add)
    with BuildSketch(Plane(origin=(0, 0, 17.945404333), x_dir=(-1, 0, 0), z_dir=(0, 0, -1))):
        with Locations((12.795744065, -0.30220442)):
            Rectangle(SKETCH_108_W, SKETCH_108_H)
    extrude(amount=EXTRUDE_38_DEPTH)

    # 草圖109 → 填料-伸長39 (add)
    with BuildSketch(Plane.ZY.offset(14.6)):
        with Locations((0.000646672, -0.30220442)):
            Rectangle(SKETCH_109_W, SKETCH_109_H)
    extrude(amount=EXTRUDE_39_DEPTH)

    # 草圖110 → 除料-伸長54 (cut, through all)
    with BuildSketch(Plane(origin=(-14.6, 0, 0), x_dir=(0, 0, -1), z_dir=(1, 0, 0))):
        with Locations((32.849487474, -0.30220442)):
            Circle(SKETCH_110_R)
    extrude(amount=-CUT_EXTRUDE_54_DEPTH, mode=Mode.SUBTRACT)

    # 草圖111 → 除料-伸長55 (cut, through all)
    with BuildSketch(Plane(origin=(3.10851187, 0, 0), x_dir=(0, 0, -1), z_dir=(1, 0, 0))):
        with Locations((-32.928668636, -0.30220442)):
            Circle(SKETCH_111_R)
    extrude(amount=-CUT_EXTRUDE_55_DEPTH, mode=Mode.SUBTRACT)

    # 草圖112 → 除料-伸長56 (cut, through all)
    with BuildSketch(Plane(origin=(0, 11.18059116, 0), x_dir=(1, 0, 0), z_dir=(0, 1, 0))):
        Polygon((3.10851187, -20.353998476), (-8.730551994, -29.607339099), (-8.730551994, -42.140780818), (3.10851187, -42.140780818), align=None)
    extrude(amount=-CUT_EXTRUDE_56_DEPTH, mode=Mode.SUBTRACT)

    # 草圖113 → 填料-伸長40 (add)
    with BuildSketch(Plane.XZ.offset(11.785)):
        Polygon((3.10851187, 20.353998476), (-8.730551994, 29.607339099), (-8.730551994, 42.140780818), (-19.6, 42.140780818), (-19.6, 12.089639112), (3.10851187, 12.089639112), align=None)
    extrude(amount=EXTRUDE_40_DEPTH)

    # 草圖120 → 填料-伸長44 (add, two sides: drawn at the far end of the back side and taken through both)
    with BuildSketch(Plane.XY.offset(50).offset(-EXTRUDE_44_DEPTH_BACK)):
        with Locations((0.10851187, -20.185)):
            Circle(SKETCH_120_R)
    extrude(amount=EXTRUDE_44_DEPTH + EXTRUDE_44_DEPTH_BACK)

    # 草圖121 → 除料-伸長58 (cut, two sides: drawn at the far end of the back side and taken through both)
    with BuildSketch(Plane(origin=(0, 0, 0), x_dir=(1, 0, 0), z_dir=(0, 1, 0)).offset(-CUT_EXTRUDE_58_DEPTH_BACK)):
        with Locations((3.140291281, -47.603289382)):
            Rectangle(SKETCH_121_W, SKETCH_121_H)
    extrude(amount=CUT_EXTRUDE_58_DEPTH + CUT_EXTRUDE_58_DEPTH_BACK, mode=Mode.SUBTRACT)


solid = cut_extrude_41_piece_1_1.part
